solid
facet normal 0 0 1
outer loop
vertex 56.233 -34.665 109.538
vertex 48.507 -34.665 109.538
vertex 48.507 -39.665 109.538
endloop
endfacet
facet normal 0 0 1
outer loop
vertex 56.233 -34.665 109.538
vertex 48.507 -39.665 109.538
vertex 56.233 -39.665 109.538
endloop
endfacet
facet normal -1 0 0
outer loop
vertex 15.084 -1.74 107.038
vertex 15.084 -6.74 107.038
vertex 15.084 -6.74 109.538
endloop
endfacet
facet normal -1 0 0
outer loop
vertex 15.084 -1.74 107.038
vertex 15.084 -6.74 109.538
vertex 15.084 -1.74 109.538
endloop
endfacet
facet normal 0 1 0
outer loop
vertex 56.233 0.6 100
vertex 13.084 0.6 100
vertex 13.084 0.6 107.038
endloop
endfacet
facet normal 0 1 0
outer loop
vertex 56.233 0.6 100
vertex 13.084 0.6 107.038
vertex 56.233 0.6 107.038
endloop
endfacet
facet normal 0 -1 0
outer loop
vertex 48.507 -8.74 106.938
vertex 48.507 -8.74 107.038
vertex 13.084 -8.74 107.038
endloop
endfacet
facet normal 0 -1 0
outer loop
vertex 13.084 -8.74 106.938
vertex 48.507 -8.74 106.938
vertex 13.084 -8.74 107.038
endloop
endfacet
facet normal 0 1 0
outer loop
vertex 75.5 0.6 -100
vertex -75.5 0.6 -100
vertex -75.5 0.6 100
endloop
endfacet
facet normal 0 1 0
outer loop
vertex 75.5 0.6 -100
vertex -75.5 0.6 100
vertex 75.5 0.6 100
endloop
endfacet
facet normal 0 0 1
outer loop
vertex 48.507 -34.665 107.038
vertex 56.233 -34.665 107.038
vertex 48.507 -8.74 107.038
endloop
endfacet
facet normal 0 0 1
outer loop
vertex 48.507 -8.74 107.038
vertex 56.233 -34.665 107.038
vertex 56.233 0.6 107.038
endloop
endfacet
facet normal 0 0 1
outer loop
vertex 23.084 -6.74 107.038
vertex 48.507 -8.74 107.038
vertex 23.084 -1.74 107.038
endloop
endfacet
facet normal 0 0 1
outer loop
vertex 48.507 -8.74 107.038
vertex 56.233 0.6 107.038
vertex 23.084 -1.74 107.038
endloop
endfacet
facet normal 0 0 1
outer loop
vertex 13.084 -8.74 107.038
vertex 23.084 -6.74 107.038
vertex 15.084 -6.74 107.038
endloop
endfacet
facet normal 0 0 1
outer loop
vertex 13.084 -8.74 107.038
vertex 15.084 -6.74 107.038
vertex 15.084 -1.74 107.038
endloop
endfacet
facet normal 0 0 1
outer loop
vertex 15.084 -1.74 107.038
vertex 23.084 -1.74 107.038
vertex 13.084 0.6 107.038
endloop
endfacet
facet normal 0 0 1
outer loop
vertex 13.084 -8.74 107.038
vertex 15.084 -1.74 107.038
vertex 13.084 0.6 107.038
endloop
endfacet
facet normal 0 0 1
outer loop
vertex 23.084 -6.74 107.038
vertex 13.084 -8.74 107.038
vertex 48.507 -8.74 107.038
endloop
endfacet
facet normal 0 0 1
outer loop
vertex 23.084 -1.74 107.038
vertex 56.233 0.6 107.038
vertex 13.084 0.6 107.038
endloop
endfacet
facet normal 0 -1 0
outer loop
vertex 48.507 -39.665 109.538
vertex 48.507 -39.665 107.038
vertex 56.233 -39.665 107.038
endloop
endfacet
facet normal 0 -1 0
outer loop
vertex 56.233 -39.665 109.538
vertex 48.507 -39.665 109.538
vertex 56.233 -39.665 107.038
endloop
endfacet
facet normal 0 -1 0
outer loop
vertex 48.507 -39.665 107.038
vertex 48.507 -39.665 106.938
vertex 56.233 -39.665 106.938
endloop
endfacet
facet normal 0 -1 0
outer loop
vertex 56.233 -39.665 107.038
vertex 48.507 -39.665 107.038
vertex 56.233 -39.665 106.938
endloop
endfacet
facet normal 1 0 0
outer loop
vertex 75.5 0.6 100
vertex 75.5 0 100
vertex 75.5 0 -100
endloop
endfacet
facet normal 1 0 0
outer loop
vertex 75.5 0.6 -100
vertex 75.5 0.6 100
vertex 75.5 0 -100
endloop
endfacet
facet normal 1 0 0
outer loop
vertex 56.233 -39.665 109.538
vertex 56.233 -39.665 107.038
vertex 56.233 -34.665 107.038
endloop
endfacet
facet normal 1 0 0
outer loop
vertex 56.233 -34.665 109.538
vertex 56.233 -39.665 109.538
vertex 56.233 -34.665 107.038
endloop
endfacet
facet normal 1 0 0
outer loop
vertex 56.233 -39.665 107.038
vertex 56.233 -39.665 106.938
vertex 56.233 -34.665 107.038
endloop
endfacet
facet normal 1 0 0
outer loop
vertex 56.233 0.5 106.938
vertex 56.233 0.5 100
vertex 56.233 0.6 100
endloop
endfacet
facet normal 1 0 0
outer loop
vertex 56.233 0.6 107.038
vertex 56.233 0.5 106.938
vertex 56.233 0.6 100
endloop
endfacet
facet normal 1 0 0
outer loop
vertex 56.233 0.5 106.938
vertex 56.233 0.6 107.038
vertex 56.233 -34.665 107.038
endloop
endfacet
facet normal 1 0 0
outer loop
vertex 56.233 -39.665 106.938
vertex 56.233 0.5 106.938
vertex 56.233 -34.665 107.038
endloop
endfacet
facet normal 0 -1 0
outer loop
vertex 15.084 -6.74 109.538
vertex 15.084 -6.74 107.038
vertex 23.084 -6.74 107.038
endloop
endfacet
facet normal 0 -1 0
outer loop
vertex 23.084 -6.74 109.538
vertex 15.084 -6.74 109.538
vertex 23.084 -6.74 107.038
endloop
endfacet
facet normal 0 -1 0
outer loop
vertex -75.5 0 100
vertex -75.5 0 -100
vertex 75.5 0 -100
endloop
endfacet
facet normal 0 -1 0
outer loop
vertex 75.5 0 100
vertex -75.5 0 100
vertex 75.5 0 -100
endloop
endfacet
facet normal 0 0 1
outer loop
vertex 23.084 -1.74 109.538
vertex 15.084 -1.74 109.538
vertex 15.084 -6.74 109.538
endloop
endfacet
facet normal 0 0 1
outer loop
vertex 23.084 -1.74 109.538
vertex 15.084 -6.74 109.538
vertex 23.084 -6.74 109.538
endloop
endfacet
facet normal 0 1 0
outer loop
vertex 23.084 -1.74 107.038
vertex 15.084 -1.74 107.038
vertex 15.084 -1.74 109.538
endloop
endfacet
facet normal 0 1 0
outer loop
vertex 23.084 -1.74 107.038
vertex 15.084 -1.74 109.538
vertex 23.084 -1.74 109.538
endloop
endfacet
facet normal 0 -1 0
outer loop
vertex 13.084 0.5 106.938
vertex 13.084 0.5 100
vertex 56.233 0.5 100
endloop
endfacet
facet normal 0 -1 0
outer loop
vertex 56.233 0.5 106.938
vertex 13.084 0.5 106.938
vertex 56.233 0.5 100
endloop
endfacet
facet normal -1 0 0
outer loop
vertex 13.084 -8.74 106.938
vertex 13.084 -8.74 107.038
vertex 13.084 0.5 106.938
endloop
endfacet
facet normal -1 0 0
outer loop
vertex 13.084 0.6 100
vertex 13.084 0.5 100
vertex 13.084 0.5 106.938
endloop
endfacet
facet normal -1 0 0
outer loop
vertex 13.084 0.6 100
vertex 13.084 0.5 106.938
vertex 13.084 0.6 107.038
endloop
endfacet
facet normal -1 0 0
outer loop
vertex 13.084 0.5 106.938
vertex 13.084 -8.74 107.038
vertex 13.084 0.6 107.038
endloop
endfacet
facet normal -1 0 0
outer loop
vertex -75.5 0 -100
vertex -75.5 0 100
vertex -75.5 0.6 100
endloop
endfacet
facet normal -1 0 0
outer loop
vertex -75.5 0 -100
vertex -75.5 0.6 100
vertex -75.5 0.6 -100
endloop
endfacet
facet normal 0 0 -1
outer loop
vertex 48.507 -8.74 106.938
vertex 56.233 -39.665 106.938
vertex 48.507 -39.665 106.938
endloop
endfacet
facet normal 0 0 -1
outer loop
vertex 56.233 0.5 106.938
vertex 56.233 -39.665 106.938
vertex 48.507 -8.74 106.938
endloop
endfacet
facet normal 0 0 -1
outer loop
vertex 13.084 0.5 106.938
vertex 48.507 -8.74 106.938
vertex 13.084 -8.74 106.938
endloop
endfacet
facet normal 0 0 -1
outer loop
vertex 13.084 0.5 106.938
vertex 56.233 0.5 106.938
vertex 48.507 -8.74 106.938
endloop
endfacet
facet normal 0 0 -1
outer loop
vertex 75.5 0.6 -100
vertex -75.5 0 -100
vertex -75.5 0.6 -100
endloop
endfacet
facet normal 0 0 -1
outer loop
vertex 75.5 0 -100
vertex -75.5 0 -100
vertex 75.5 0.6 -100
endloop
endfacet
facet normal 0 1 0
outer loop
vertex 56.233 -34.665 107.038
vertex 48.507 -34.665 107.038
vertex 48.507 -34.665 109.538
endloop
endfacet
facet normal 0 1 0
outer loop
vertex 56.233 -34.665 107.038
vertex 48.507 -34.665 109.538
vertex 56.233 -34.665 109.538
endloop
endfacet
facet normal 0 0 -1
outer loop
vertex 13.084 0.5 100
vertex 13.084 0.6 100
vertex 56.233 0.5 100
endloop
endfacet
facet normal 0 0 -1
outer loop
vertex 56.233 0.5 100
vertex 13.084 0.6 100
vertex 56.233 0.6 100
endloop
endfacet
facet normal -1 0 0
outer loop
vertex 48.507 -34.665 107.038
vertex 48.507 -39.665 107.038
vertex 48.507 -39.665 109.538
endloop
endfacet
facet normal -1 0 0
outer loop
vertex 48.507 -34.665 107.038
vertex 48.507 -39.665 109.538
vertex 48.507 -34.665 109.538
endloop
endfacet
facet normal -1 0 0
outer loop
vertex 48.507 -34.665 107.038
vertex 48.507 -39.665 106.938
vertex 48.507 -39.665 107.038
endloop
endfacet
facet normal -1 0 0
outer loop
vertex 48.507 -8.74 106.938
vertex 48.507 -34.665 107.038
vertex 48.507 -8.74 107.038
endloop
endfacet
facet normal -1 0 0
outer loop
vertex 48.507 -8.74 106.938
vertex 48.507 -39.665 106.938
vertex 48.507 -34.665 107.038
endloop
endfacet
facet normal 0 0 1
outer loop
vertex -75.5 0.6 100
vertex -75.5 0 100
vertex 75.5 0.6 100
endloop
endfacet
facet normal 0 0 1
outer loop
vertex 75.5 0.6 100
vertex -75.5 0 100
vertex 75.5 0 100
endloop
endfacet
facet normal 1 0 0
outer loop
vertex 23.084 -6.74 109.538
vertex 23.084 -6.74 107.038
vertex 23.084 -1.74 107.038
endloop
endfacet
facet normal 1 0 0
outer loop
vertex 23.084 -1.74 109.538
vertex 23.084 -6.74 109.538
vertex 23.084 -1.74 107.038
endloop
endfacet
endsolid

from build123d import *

# Parameters (mm, degrees)
CROQUIS1_W              = 151
CROQUIS1_H              = 200
SALIENTE_EXTRUIR1_DEPTH = 0.6
CROQUIS4_W              = 43.149370068
CROQUIS4_H              = 7.03827607
SALIENTE_EXTRUIR2_DEPTH = 0.1
SALIENTE_EXTRUIR3_DEPTH = 0.1
CROQUIS7_W              = 7.726087965
CROQUIS7_H              = 5
CROQUIS7_W_2            = 8
SALIENTE_EXTRUIR5_DEPTH = 2.5


with BuildPart() as part:
    # Croquis1 → Saliente-Extruir1 (new body)
    with BuildSketch(Plane(origin=(0, 0, 0), x_dir=(1, 0, 0), z_dir=(0, 1, 0))):
        Rectangle(CROQUIS1_W, CROQUIS1_H)
    extrude(amount=SALIENTE_EXTRUIR1_DEPTH)


with BuildPart() as body_2:
    # Croquis4 → Saliente-Extruir2 (new body)
    with BuildSketch(Plane(origin=(0, 0.6, 0), x_dir=(1, 0, 0), z_dir=(0, 1, 0))):
        with Locations((34.65868757, -103.519138035)):
            Rectangle(CROQUIS4_W, CROQUIS4_H)
    extrude(amount=-SALIENTE_EXTRUIR2_DEPTH)

    # Croquis5 → Saliente-Extruir3 (add)
    with BuildSketch(Plane.XY.offset(107.03827607)):
        Polygon((56.233372604, 0.5), (56.233372604, -39.664836745), (48.507284639, -39.664836745), (48.507284639, -8.740162196), (13.084002536, -8.740162196), (13.084002536, 0.5), align=None)
    extrude(amount=-SALIENTE_EXTRUIR3_DEPTH)

    # Croquis7 → Saliente-Extruir5 (add)
    with BuildSketch(Plane.XY.offset(107.03827607)):
        with Locations((52.370328622, -37.164836745)):
            Rectangle(CROQUIS7_W, CROQUIS7_H)
        with Locations((19.084002536, -4.240162196)):
            Rectangle(CROQUIS7_W_2, CROQUIS7_H)
    extrude(amount=SALIENTE_EXTRUIR5_DEPTH)


solid = Compound([part.part, body_2.part])
